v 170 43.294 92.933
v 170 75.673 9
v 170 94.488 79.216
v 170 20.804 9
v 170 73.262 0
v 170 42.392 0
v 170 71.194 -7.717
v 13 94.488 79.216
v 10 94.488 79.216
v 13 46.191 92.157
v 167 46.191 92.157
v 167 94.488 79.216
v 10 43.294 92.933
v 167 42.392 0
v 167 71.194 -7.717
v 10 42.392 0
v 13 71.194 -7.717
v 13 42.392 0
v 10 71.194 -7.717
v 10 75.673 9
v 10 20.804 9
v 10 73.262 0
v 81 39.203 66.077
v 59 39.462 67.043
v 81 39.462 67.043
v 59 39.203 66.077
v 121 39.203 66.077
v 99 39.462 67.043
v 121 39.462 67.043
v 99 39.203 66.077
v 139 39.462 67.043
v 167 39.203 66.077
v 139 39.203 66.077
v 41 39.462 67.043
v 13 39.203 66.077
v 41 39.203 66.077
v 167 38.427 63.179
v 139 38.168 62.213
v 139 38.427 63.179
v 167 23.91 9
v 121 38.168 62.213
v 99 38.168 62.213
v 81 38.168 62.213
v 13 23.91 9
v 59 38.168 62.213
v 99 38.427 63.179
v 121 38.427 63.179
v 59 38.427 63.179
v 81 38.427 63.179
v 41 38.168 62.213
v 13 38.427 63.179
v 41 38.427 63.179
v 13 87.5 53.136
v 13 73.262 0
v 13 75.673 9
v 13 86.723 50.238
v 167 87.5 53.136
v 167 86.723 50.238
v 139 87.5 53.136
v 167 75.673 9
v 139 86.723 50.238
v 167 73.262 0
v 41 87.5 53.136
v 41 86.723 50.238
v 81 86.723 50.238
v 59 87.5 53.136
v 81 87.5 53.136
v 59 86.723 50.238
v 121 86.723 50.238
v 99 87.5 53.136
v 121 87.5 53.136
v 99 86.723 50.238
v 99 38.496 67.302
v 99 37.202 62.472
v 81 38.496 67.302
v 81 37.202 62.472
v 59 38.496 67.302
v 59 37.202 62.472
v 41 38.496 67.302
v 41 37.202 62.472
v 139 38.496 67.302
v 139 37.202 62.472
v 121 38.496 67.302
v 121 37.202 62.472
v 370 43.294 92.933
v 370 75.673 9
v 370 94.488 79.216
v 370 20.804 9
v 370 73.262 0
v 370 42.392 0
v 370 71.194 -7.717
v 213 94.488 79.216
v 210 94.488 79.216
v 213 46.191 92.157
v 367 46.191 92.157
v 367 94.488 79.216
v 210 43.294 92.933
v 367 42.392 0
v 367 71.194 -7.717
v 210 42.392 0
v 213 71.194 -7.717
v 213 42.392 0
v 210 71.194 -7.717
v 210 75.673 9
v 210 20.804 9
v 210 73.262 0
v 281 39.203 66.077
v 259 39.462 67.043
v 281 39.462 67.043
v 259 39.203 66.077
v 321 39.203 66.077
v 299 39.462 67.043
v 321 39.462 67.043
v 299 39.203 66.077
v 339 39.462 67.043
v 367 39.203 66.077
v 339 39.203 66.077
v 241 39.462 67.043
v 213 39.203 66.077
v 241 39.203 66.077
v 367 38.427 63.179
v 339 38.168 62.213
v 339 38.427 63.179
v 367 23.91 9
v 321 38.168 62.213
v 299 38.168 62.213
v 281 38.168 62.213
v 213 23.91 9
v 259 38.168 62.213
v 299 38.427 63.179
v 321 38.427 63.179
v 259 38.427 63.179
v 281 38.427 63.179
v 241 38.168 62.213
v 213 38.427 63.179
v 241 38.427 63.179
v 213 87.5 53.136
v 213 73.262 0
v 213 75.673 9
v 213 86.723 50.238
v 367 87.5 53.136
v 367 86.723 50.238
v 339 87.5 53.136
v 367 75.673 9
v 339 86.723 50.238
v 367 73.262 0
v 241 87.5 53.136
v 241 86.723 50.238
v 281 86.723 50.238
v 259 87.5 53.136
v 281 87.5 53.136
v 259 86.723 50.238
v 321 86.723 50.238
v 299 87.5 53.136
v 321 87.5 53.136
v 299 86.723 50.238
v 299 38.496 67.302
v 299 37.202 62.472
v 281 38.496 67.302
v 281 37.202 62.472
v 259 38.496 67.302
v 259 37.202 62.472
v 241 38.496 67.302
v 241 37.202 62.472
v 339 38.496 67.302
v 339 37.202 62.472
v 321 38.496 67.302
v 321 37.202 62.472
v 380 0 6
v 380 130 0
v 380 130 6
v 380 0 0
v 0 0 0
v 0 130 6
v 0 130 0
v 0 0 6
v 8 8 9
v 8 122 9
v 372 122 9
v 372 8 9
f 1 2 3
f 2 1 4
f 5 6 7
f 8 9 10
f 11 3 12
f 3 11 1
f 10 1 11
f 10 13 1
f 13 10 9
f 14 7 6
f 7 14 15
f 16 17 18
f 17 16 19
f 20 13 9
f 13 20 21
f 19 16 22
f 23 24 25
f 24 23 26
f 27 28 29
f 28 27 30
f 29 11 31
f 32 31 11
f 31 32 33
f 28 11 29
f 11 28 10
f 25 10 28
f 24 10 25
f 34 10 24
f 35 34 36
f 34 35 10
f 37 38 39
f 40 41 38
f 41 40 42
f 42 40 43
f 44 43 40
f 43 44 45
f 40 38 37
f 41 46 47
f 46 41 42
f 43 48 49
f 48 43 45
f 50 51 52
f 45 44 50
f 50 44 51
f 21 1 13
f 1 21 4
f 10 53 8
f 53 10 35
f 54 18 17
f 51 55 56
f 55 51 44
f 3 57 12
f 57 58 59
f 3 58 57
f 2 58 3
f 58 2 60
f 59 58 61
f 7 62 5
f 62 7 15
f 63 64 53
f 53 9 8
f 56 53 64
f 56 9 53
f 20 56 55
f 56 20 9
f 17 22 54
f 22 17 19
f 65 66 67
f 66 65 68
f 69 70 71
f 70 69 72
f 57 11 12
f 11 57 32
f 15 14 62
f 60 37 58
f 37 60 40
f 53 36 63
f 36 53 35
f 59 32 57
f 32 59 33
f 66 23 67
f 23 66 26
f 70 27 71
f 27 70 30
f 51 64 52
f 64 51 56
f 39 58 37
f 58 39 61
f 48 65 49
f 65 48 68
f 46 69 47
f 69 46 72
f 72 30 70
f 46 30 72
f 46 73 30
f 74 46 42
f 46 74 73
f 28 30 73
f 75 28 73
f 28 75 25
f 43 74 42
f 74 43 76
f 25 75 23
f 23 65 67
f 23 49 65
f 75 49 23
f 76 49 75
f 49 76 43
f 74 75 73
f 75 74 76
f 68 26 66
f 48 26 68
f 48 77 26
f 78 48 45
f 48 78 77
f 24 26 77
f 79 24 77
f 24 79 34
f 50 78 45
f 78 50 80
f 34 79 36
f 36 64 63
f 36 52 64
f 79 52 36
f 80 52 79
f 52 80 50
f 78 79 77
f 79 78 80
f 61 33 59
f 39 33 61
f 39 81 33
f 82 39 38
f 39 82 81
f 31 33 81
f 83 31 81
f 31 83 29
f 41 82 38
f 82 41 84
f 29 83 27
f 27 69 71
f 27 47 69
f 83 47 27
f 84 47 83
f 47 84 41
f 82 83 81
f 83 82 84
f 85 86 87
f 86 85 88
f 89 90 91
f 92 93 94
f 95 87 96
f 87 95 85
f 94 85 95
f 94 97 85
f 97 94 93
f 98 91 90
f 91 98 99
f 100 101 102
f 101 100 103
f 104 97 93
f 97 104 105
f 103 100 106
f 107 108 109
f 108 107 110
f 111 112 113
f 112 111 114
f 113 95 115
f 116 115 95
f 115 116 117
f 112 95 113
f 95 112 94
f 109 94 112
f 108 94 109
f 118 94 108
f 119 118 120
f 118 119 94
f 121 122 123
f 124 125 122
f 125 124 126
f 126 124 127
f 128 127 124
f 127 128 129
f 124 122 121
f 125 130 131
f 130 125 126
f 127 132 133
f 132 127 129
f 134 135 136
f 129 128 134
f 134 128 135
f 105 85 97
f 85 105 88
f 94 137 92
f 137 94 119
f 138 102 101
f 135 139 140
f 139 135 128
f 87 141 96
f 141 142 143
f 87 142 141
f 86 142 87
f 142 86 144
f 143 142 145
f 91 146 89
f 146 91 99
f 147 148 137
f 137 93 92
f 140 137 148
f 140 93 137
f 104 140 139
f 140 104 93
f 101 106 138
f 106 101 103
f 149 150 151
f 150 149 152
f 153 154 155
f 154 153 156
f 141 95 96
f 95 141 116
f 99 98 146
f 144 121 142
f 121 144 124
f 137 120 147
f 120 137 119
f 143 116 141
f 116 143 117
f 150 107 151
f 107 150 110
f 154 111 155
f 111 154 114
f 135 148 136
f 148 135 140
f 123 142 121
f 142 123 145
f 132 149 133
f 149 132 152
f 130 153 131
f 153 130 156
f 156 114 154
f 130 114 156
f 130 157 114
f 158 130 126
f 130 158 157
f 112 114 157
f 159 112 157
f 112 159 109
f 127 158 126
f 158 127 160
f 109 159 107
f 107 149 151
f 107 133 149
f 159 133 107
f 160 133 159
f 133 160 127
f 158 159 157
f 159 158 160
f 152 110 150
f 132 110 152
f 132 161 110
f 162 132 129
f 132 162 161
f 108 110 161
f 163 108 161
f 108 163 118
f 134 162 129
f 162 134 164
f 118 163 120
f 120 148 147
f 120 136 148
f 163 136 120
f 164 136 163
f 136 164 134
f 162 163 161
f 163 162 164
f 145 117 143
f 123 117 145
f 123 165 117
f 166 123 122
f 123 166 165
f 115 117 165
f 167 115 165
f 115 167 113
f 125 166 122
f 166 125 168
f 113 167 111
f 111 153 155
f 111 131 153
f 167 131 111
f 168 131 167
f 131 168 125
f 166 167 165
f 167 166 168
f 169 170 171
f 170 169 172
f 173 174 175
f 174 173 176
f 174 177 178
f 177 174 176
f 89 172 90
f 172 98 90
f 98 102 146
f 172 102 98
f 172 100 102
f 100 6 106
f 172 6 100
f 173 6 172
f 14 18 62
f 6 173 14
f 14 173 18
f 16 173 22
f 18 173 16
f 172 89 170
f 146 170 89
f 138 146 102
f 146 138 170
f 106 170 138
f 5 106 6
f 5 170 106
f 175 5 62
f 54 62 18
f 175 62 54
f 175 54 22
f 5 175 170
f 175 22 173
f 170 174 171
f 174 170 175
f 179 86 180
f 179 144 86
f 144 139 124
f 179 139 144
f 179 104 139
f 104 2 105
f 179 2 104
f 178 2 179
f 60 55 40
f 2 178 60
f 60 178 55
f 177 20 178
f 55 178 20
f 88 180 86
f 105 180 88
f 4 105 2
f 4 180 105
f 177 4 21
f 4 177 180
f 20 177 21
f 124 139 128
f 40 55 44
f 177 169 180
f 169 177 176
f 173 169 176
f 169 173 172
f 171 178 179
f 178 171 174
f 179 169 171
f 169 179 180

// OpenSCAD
// Dual Controller Stand - PS5 / Xbox / Switch Pro
// PLA/PETG — 0.2mm, 3 walls, 15% infill, no supports
// Holds 2 controllers + charging cables through base slots

CTRL_W     = 160;  // Controller cradle width
CTRL_DEPTH = 50;   // Cradle depth
CRADLE_H   = 30;   // Height of grip pocket
ANGLE      = 15;   // Lean-back angle
BASE_W     = 380;
BASE_D     = 130;
BASE_H     = 6;
WALL_T     = 3.0;  // PLA: keep ≥ 3mm for strength
POST_H     = 60;
CABLE_W    = 18;   // USB-C slot width
CABLE_H    = 10;

module base_plate() {
    hull() {
        cube([BASE_W, BASE_D, BASE_H]);
        translate([8, 8, 0]) cube([BASE_W - 16, BASE_D - 16, BASE_H + 3]);
    }
}

module cradle() {
    difference() {
        union() {
            // Back wall
            cube([CTRL_W, WALL_T, POST_H + CRADLE_H]);
            // Side walls
            cube([WALL_T, CTRL_DEPTH + WALL_T, POST_H + CRADLE_H]);
            translate([CTRL_W - WALL_T, 0, 0])
                cube([WALL_T, CTRL_DEPTH + WALL_T, POST_H + CRADLE_H]);
            // Shelf
            translate([0, WALL_T, POST_H])
                cube([CTRL_W, CTRL_DEPTH, WALL_T]);
        }
        // Cable slots on shelf
        for (x = [CTRL_W/2 - CABLE_W/2, CTRL_W * 0.25 - CABLE_W/2, CTRL_W * 0.75 - CABLE_W/2])
            translate([x, WALL_T - 1, POST_H - 1])
                cube([CABLE_W, CTRL_DEPTH + 2, WALL_T + 2]);
    }
}

// Two cradles, symmetric
translate([10, 20, BASE_H])
    rotate([-ANGLE, 0, 0])
        cradle();

translate([BASE_W - CTRL_W - 10, 20, BASE_H])
    rotate([-ANGLE, 0, 0])
        cradle();

base_plate();
